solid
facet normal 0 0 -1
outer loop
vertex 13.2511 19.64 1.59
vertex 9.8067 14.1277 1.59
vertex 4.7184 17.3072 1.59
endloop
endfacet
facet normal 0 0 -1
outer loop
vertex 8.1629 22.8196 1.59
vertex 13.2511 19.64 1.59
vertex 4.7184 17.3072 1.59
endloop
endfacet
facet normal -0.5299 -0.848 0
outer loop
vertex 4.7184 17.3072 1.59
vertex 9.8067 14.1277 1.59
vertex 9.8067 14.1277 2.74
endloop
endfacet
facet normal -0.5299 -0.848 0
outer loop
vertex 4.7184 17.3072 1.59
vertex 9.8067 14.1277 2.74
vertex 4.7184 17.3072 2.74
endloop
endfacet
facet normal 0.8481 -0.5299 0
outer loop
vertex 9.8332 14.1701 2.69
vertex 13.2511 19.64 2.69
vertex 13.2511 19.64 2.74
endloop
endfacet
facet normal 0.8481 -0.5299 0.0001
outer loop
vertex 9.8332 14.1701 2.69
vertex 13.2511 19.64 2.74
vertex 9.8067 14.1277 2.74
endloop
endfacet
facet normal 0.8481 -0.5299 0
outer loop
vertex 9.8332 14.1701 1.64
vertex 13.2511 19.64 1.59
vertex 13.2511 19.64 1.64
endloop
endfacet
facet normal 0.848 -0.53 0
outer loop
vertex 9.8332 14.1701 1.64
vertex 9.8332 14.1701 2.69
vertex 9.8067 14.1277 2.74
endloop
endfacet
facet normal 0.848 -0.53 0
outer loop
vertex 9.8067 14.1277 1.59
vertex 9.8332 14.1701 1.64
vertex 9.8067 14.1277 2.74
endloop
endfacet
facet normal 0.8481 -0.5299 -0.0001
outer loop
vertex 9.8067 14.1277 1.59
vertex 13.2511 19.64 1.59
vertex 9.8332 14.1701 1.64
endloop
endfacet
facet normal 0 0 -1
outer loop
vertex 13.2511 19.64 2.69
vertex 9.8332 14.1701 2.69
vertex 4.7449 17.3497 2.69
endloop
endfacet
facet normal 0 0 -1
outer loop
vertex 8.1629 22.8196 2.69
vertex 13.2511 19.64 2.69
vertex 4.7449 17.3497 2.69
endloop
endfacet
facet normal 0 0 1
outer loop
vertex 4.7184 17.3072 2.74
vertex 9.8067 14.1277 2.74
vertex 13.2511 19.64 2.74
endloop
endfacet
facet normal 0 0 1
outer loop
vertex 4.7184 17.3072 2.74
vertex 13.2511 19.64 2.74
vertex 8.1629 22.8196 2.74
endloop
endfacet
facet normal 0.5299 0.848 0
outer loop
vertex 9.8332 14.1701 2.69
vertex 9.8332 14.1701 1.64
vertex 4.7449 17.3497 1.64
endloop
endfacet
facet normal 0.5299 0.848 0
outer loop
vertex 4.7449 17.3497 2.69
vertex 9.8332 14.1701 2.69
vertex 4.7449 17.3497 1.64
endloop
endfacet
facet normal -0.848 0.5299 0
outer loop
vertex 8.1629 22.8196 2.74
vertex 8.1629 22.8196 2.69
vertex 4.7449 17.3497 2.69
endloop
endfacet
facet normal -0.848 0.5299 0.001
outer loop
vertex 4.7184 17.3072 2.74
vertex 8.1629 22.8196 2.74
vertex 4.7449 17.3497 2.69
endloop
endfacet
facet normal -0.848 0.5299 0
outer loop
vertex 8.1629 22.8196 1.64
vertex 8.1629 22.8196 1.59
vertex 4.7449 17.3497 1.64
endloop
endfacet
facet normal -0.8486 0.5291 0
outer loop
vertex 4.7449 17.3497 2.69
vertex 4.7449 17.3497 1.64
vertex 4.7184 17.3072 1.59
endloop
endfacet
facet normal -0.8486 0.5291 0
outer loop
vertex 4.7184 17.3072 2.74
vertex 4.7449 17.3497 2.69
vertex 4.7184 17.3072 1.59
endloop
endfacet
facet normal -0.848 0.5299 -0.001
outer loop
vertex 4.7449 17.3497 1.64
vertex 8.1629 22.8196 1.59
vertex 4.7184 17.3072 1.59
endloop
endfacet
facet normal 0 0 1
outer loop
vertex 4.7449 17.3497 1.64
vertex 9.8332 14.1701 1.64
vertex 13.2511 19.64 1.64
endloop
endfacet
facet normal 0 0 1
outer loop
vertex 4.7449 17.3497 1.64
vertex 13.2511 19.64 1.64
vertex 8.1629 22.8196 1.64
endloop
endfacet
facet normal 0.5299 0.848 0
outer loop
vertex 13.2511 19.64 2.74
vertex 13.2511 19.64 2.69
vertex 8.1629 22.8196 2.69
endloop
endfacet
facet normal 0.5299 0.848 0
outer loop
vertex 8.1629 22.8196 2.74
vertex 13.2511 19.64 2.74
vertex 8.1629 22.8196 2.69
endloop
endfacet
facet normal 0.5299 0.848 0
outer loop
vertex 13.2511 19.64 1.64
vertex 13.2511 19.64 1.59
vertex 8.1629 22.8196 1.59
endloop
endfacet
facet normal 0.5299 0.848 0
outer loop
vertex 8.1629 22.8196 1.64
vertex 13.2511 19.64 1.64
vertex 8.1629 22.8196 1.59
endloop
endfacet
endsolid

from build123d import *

# Parameters (mm, degrees)
BOX184_W               = 6
BOX184_H               = 6.45
BOX184_DEPTH           = 1.05
BOX183_W               = 6
BOX183_H               = 6.5
BOX183_DEPTH           = 1.15
CUT092_PLACEMENT_ANGLE = 148


with BuildPart() as small_cu_gnd_electrode076:
    # Box184 → Box184 (new body)
    with BuildSketch(Plane.XY.offset(0.05)):
        with Locations((3, 3.225)):
            Rectangle(BOX184_W, BOX184_H)
    extrude(amount=BOX184_DEPTH)


with BuildPart() as small_cu_electrode_short_axis_gnd009:
    # Box183 → Box183 (new body)
    with BuildSketch(Plane.XY):
        with Locations((3, 3.25)):
            Rectangle(BOX183_W, BOX183_H)
    extrude(amount=BOX183_DEPTH)

    # Cut092: cut Small Cu GND Electrode076
    add(small_cu_gnd_electrode076.part, mode=Mode.SUBTRACT)


with BuildPart() as small_cu_electrode_short_axis_gnd009_1:
    # Cut092 placement: moved
    add(small_cu_electrode_short_axis_gnd009.part.moved(Location((13.251142, 19.640047, 1.59))).rotate(Axis((13.251142, 19.640047, 1.59), (0, 0, 1)), CUT092_PLACEMENT_ANGLE))


solid = small_cu_electrode_short_axis_gnd009_1.part
